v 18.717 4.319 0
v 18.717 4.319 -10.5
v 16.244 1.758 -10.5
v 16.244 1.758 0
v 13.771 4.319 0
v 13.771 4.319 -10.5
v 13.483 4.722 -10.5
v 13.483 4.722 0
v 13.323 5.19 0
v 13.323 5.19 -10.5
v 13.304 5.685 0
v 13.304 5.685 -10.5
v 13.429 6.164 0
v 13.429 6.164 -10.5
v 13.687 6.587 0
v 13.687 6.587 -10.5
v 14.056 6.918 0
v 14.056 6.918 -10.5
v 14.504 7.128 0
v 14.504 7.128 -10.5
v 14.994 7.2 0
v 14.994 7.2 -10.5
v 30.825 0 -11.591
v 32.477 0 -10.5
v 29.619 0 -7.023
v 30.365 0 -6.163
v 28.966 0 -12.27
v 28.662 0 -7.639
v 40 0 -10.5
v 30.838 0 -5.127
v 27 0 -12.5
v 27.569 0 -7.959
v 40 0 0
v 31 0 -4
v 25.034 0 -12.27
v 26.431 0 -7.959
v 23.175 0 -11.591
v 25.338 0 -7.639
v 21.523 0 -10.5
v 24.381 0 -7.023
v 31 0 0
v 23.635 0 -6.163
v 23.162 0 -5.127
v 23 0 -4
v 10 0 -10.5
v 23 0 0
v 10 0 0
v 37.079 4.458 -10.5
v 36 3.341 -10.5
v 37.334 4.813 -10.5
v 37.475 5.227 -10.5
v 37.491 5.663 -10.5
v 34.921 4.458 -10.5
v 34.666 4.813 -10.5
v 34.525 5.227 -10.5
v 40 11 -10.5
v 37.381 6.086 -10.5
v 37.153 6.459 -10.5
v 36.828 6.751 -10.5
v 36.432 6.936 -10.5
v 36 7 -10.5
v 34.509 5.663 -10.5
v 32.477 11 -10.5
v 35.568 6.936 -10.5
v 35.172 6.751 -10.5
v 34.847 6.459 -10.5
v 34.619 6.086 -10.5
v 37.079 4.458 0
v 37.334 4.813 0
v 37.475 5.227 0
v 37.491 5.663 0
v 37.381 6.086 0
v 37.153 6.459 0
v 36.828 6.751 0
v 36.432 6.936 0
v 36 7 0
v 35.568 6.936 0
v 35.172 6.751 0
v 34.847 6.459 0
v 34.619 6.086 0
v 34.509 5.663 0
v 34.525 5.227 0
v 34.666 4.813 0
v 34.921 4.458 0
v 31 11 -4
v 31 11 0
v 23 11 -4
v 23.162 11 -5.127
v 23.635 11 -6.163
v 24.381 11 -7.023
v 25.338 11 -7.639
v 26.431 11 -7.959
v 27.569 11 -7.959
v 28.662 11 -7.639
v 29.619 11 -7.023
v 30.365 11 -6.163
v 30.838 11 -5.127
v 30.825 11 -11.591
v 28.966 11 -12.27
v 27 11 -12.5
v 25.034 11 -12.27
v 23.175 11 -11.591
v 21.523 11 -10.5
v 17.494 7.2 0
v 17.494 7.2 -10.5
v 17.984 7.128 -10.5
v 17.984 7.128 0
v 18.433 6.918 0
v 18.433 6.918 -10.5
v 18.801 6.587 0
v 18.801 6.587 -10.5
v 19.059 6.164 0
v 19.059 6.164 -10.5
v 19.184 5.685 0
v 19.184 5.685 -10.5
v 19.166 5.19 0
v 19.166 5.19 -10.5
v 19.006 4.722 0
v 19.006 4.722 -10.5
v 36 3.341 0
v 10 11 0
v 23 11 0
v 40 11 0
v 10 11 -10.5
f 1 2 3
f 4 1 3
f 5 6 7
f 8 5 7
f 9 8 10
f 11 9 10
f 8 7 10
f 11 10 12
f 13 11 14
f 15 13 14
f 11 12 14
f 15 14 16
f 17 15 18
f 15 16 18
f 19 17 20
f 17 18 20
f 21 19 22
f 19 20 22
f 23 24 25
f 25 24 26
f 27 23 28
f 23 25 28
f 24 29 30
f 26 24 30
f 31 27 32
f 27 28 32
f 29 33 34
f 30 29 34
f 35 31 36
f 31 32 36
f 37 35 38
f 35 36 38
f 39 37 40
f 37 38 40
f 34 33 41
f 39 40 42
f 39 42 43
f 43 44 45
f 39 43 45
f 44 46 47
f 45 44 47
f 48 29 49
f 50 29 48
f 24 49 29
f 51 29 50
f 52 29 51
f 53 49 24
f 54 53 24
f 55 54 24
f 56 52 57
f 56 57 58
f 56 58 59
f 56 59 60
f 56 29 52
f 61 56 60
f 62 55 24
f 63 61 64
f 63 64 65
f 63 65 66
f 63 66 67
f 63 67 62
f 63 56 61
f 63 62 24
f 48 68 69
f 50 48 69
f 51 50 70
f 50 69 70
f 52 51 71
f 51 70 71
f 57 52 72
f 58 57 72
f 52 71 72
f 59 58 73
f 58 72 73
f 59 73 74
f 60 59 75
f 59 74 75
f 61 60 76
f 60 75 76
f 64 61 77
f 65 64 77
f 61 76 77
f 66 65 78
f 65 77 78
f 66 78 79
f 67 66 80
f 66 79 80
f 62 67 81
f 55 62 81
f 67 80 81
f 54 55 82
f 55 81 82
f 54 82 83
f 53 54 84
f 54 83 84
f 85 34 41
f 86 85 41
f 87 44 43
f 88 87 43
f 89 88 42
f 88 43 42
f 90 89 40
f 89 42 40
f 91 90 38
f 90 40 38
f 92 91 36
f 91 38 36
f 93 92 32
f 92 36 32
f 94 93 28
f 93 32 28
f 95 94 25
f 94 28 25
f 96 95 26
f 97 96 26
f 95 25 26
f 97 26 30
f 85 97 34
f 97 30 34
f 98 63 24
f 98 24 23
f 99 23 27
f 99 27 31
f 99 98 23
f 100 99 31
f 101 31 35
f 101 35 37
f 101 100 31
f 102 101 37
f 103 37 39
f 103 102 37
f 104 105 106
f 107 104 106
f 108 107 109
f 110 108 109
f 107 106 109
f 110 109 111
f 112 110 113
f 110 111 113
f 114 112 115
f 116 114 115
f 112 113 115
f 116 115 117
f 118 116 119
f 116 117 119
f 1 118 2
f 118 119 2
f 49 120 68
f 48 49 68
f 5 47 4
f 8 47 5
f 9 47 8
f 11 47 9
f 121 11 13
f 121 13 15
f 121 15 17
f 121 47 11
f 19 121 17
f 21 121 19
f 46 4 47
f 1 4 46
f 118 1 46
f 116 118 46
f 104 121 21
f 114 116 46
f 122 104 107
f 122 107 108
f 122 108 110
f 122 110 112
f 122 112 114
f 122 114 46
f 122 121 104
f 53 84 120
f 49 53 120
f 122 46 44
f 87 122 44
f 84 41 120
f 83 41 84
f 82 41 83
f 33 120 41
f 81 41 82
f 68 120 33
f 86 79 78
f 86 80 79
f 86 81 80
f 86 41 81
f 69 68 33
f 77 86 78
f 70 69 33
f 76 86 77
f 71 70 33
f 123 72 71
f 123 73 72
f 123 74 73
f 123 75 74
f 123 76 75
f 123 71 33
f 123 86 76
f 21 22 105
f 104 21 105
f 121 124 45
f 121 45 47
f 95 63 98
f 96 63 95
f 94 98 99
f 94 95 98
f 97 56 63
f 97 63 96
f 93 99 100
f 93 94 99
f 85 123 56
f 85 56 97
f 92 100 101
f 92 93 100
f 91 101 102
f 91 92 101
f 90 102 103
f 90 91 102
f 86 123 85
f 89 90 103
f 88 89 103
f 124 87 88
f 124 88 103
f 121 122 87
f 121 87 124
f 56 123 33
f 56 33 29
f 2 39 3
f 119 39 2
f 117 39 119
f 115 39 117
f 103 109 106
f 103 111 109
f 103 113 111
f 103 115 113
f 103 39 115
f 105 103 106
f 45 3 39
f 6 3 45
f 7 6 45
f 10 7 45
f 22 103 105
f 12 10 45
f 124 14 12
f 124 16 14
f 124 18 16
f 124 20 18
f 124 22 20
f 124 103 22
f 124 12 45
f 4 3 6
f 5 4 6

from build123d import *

# Parameters (mm, degrees)
BOSS_EXTRUDE1_DEPTH = 11
CUT_EXTRUDE1_DEPTH  = 44.327243162
CUT_EXTRUDE2_DEPTH  = 44.327243162
CUT_EXTRUDE3_DEPTH  = 43.793106922


with BuildPart() as part:
    # Sketch1 → Boss-Extrude1 (new body)
    with BuildSketch(Plane(origin=(0, 11, 0), x_dir=(-1, 0, 0), z_dir=(0, 1, 0))):
        with BuildLine():
            Line((-10, 0), (-40, 0))
            Line((-40, 0), (-40, -10.5))
            Line((-40, -10.5), (-32.477225575, -10.5))
            ThreePointArc((-32.477225575, -10.5), (-27, -12.5), (-21.522774425, -10.5))
            Line((-21.522774425, -10.5), (-10, -10.5))
            Line((-10, -10.5), (-10, 0))
        make_face()
    extrude(amount=-BOSS_EXTRUDE1_DEPTH)

    # Sketch2 → Cut-Extrude1 (cut, through all)
    with BuildSketch(Plane.XZ):
        with BuildLine():
            Line((31, 0), (23, 0))
            Line((23, 0), (23, -4))
            ThreePointArc((23, -4), (27, -8), (31, -4))
            Line((31, -4), (31, 0))
        make_face()
    extrude(amount=-CUT_EXTRUDE1_DEPTH, mode=Mode.SUBTRACT)

    # Sketch3 → Cut-Extrude2 (cut, through all)
    with BuildSketch(Plane.XY):
        with BuildLine():
            Line((34.920990299, 4.458012444), (36, 3.340665191))
            Line((36, 3.340665191), (37.079009701, 4.458012444))
            ThreePointArc((37.079009701, 4.458012444), (36, 7), (34.920990299, 4.458012444))
        make_face()
    extrude(amount=-CUT_EXTRUDE2_DEPTH, mode=Mode.SUBTRACT)

    # Sketch4 → Cut-Extrude3 (cut, through all)
    with BuildSketch(Plane(origin=(0, 0, -10.5), x_dir=(-1, 0, 0), z_dir=(0, 0, -1))):
        with BuildLine():
            Line((-16.244261233, 1.75834099), (-13.771383572, 4.31908077))
            ThreePointArc((-13.771383572, 4.31908077), (-13.429402982, 6.164242918), (-14.994261233, 7.2))
            Line((-14.994261233, 7.2), (-17.494261233, 7.2))
            ThreePointArc((-17.494261233, 7.2), (-19.059119484, 6.164242918), (-18.717138893, 4.31908077))
            Line((-18.717138893, 4.31908077), (-16.244261233, 1.75834099))
        make_face()
    extrude(amount=-CUT_EXTRUDE3_DEPTH, mode=Mode.SUBTRACT)


solid = part.part
